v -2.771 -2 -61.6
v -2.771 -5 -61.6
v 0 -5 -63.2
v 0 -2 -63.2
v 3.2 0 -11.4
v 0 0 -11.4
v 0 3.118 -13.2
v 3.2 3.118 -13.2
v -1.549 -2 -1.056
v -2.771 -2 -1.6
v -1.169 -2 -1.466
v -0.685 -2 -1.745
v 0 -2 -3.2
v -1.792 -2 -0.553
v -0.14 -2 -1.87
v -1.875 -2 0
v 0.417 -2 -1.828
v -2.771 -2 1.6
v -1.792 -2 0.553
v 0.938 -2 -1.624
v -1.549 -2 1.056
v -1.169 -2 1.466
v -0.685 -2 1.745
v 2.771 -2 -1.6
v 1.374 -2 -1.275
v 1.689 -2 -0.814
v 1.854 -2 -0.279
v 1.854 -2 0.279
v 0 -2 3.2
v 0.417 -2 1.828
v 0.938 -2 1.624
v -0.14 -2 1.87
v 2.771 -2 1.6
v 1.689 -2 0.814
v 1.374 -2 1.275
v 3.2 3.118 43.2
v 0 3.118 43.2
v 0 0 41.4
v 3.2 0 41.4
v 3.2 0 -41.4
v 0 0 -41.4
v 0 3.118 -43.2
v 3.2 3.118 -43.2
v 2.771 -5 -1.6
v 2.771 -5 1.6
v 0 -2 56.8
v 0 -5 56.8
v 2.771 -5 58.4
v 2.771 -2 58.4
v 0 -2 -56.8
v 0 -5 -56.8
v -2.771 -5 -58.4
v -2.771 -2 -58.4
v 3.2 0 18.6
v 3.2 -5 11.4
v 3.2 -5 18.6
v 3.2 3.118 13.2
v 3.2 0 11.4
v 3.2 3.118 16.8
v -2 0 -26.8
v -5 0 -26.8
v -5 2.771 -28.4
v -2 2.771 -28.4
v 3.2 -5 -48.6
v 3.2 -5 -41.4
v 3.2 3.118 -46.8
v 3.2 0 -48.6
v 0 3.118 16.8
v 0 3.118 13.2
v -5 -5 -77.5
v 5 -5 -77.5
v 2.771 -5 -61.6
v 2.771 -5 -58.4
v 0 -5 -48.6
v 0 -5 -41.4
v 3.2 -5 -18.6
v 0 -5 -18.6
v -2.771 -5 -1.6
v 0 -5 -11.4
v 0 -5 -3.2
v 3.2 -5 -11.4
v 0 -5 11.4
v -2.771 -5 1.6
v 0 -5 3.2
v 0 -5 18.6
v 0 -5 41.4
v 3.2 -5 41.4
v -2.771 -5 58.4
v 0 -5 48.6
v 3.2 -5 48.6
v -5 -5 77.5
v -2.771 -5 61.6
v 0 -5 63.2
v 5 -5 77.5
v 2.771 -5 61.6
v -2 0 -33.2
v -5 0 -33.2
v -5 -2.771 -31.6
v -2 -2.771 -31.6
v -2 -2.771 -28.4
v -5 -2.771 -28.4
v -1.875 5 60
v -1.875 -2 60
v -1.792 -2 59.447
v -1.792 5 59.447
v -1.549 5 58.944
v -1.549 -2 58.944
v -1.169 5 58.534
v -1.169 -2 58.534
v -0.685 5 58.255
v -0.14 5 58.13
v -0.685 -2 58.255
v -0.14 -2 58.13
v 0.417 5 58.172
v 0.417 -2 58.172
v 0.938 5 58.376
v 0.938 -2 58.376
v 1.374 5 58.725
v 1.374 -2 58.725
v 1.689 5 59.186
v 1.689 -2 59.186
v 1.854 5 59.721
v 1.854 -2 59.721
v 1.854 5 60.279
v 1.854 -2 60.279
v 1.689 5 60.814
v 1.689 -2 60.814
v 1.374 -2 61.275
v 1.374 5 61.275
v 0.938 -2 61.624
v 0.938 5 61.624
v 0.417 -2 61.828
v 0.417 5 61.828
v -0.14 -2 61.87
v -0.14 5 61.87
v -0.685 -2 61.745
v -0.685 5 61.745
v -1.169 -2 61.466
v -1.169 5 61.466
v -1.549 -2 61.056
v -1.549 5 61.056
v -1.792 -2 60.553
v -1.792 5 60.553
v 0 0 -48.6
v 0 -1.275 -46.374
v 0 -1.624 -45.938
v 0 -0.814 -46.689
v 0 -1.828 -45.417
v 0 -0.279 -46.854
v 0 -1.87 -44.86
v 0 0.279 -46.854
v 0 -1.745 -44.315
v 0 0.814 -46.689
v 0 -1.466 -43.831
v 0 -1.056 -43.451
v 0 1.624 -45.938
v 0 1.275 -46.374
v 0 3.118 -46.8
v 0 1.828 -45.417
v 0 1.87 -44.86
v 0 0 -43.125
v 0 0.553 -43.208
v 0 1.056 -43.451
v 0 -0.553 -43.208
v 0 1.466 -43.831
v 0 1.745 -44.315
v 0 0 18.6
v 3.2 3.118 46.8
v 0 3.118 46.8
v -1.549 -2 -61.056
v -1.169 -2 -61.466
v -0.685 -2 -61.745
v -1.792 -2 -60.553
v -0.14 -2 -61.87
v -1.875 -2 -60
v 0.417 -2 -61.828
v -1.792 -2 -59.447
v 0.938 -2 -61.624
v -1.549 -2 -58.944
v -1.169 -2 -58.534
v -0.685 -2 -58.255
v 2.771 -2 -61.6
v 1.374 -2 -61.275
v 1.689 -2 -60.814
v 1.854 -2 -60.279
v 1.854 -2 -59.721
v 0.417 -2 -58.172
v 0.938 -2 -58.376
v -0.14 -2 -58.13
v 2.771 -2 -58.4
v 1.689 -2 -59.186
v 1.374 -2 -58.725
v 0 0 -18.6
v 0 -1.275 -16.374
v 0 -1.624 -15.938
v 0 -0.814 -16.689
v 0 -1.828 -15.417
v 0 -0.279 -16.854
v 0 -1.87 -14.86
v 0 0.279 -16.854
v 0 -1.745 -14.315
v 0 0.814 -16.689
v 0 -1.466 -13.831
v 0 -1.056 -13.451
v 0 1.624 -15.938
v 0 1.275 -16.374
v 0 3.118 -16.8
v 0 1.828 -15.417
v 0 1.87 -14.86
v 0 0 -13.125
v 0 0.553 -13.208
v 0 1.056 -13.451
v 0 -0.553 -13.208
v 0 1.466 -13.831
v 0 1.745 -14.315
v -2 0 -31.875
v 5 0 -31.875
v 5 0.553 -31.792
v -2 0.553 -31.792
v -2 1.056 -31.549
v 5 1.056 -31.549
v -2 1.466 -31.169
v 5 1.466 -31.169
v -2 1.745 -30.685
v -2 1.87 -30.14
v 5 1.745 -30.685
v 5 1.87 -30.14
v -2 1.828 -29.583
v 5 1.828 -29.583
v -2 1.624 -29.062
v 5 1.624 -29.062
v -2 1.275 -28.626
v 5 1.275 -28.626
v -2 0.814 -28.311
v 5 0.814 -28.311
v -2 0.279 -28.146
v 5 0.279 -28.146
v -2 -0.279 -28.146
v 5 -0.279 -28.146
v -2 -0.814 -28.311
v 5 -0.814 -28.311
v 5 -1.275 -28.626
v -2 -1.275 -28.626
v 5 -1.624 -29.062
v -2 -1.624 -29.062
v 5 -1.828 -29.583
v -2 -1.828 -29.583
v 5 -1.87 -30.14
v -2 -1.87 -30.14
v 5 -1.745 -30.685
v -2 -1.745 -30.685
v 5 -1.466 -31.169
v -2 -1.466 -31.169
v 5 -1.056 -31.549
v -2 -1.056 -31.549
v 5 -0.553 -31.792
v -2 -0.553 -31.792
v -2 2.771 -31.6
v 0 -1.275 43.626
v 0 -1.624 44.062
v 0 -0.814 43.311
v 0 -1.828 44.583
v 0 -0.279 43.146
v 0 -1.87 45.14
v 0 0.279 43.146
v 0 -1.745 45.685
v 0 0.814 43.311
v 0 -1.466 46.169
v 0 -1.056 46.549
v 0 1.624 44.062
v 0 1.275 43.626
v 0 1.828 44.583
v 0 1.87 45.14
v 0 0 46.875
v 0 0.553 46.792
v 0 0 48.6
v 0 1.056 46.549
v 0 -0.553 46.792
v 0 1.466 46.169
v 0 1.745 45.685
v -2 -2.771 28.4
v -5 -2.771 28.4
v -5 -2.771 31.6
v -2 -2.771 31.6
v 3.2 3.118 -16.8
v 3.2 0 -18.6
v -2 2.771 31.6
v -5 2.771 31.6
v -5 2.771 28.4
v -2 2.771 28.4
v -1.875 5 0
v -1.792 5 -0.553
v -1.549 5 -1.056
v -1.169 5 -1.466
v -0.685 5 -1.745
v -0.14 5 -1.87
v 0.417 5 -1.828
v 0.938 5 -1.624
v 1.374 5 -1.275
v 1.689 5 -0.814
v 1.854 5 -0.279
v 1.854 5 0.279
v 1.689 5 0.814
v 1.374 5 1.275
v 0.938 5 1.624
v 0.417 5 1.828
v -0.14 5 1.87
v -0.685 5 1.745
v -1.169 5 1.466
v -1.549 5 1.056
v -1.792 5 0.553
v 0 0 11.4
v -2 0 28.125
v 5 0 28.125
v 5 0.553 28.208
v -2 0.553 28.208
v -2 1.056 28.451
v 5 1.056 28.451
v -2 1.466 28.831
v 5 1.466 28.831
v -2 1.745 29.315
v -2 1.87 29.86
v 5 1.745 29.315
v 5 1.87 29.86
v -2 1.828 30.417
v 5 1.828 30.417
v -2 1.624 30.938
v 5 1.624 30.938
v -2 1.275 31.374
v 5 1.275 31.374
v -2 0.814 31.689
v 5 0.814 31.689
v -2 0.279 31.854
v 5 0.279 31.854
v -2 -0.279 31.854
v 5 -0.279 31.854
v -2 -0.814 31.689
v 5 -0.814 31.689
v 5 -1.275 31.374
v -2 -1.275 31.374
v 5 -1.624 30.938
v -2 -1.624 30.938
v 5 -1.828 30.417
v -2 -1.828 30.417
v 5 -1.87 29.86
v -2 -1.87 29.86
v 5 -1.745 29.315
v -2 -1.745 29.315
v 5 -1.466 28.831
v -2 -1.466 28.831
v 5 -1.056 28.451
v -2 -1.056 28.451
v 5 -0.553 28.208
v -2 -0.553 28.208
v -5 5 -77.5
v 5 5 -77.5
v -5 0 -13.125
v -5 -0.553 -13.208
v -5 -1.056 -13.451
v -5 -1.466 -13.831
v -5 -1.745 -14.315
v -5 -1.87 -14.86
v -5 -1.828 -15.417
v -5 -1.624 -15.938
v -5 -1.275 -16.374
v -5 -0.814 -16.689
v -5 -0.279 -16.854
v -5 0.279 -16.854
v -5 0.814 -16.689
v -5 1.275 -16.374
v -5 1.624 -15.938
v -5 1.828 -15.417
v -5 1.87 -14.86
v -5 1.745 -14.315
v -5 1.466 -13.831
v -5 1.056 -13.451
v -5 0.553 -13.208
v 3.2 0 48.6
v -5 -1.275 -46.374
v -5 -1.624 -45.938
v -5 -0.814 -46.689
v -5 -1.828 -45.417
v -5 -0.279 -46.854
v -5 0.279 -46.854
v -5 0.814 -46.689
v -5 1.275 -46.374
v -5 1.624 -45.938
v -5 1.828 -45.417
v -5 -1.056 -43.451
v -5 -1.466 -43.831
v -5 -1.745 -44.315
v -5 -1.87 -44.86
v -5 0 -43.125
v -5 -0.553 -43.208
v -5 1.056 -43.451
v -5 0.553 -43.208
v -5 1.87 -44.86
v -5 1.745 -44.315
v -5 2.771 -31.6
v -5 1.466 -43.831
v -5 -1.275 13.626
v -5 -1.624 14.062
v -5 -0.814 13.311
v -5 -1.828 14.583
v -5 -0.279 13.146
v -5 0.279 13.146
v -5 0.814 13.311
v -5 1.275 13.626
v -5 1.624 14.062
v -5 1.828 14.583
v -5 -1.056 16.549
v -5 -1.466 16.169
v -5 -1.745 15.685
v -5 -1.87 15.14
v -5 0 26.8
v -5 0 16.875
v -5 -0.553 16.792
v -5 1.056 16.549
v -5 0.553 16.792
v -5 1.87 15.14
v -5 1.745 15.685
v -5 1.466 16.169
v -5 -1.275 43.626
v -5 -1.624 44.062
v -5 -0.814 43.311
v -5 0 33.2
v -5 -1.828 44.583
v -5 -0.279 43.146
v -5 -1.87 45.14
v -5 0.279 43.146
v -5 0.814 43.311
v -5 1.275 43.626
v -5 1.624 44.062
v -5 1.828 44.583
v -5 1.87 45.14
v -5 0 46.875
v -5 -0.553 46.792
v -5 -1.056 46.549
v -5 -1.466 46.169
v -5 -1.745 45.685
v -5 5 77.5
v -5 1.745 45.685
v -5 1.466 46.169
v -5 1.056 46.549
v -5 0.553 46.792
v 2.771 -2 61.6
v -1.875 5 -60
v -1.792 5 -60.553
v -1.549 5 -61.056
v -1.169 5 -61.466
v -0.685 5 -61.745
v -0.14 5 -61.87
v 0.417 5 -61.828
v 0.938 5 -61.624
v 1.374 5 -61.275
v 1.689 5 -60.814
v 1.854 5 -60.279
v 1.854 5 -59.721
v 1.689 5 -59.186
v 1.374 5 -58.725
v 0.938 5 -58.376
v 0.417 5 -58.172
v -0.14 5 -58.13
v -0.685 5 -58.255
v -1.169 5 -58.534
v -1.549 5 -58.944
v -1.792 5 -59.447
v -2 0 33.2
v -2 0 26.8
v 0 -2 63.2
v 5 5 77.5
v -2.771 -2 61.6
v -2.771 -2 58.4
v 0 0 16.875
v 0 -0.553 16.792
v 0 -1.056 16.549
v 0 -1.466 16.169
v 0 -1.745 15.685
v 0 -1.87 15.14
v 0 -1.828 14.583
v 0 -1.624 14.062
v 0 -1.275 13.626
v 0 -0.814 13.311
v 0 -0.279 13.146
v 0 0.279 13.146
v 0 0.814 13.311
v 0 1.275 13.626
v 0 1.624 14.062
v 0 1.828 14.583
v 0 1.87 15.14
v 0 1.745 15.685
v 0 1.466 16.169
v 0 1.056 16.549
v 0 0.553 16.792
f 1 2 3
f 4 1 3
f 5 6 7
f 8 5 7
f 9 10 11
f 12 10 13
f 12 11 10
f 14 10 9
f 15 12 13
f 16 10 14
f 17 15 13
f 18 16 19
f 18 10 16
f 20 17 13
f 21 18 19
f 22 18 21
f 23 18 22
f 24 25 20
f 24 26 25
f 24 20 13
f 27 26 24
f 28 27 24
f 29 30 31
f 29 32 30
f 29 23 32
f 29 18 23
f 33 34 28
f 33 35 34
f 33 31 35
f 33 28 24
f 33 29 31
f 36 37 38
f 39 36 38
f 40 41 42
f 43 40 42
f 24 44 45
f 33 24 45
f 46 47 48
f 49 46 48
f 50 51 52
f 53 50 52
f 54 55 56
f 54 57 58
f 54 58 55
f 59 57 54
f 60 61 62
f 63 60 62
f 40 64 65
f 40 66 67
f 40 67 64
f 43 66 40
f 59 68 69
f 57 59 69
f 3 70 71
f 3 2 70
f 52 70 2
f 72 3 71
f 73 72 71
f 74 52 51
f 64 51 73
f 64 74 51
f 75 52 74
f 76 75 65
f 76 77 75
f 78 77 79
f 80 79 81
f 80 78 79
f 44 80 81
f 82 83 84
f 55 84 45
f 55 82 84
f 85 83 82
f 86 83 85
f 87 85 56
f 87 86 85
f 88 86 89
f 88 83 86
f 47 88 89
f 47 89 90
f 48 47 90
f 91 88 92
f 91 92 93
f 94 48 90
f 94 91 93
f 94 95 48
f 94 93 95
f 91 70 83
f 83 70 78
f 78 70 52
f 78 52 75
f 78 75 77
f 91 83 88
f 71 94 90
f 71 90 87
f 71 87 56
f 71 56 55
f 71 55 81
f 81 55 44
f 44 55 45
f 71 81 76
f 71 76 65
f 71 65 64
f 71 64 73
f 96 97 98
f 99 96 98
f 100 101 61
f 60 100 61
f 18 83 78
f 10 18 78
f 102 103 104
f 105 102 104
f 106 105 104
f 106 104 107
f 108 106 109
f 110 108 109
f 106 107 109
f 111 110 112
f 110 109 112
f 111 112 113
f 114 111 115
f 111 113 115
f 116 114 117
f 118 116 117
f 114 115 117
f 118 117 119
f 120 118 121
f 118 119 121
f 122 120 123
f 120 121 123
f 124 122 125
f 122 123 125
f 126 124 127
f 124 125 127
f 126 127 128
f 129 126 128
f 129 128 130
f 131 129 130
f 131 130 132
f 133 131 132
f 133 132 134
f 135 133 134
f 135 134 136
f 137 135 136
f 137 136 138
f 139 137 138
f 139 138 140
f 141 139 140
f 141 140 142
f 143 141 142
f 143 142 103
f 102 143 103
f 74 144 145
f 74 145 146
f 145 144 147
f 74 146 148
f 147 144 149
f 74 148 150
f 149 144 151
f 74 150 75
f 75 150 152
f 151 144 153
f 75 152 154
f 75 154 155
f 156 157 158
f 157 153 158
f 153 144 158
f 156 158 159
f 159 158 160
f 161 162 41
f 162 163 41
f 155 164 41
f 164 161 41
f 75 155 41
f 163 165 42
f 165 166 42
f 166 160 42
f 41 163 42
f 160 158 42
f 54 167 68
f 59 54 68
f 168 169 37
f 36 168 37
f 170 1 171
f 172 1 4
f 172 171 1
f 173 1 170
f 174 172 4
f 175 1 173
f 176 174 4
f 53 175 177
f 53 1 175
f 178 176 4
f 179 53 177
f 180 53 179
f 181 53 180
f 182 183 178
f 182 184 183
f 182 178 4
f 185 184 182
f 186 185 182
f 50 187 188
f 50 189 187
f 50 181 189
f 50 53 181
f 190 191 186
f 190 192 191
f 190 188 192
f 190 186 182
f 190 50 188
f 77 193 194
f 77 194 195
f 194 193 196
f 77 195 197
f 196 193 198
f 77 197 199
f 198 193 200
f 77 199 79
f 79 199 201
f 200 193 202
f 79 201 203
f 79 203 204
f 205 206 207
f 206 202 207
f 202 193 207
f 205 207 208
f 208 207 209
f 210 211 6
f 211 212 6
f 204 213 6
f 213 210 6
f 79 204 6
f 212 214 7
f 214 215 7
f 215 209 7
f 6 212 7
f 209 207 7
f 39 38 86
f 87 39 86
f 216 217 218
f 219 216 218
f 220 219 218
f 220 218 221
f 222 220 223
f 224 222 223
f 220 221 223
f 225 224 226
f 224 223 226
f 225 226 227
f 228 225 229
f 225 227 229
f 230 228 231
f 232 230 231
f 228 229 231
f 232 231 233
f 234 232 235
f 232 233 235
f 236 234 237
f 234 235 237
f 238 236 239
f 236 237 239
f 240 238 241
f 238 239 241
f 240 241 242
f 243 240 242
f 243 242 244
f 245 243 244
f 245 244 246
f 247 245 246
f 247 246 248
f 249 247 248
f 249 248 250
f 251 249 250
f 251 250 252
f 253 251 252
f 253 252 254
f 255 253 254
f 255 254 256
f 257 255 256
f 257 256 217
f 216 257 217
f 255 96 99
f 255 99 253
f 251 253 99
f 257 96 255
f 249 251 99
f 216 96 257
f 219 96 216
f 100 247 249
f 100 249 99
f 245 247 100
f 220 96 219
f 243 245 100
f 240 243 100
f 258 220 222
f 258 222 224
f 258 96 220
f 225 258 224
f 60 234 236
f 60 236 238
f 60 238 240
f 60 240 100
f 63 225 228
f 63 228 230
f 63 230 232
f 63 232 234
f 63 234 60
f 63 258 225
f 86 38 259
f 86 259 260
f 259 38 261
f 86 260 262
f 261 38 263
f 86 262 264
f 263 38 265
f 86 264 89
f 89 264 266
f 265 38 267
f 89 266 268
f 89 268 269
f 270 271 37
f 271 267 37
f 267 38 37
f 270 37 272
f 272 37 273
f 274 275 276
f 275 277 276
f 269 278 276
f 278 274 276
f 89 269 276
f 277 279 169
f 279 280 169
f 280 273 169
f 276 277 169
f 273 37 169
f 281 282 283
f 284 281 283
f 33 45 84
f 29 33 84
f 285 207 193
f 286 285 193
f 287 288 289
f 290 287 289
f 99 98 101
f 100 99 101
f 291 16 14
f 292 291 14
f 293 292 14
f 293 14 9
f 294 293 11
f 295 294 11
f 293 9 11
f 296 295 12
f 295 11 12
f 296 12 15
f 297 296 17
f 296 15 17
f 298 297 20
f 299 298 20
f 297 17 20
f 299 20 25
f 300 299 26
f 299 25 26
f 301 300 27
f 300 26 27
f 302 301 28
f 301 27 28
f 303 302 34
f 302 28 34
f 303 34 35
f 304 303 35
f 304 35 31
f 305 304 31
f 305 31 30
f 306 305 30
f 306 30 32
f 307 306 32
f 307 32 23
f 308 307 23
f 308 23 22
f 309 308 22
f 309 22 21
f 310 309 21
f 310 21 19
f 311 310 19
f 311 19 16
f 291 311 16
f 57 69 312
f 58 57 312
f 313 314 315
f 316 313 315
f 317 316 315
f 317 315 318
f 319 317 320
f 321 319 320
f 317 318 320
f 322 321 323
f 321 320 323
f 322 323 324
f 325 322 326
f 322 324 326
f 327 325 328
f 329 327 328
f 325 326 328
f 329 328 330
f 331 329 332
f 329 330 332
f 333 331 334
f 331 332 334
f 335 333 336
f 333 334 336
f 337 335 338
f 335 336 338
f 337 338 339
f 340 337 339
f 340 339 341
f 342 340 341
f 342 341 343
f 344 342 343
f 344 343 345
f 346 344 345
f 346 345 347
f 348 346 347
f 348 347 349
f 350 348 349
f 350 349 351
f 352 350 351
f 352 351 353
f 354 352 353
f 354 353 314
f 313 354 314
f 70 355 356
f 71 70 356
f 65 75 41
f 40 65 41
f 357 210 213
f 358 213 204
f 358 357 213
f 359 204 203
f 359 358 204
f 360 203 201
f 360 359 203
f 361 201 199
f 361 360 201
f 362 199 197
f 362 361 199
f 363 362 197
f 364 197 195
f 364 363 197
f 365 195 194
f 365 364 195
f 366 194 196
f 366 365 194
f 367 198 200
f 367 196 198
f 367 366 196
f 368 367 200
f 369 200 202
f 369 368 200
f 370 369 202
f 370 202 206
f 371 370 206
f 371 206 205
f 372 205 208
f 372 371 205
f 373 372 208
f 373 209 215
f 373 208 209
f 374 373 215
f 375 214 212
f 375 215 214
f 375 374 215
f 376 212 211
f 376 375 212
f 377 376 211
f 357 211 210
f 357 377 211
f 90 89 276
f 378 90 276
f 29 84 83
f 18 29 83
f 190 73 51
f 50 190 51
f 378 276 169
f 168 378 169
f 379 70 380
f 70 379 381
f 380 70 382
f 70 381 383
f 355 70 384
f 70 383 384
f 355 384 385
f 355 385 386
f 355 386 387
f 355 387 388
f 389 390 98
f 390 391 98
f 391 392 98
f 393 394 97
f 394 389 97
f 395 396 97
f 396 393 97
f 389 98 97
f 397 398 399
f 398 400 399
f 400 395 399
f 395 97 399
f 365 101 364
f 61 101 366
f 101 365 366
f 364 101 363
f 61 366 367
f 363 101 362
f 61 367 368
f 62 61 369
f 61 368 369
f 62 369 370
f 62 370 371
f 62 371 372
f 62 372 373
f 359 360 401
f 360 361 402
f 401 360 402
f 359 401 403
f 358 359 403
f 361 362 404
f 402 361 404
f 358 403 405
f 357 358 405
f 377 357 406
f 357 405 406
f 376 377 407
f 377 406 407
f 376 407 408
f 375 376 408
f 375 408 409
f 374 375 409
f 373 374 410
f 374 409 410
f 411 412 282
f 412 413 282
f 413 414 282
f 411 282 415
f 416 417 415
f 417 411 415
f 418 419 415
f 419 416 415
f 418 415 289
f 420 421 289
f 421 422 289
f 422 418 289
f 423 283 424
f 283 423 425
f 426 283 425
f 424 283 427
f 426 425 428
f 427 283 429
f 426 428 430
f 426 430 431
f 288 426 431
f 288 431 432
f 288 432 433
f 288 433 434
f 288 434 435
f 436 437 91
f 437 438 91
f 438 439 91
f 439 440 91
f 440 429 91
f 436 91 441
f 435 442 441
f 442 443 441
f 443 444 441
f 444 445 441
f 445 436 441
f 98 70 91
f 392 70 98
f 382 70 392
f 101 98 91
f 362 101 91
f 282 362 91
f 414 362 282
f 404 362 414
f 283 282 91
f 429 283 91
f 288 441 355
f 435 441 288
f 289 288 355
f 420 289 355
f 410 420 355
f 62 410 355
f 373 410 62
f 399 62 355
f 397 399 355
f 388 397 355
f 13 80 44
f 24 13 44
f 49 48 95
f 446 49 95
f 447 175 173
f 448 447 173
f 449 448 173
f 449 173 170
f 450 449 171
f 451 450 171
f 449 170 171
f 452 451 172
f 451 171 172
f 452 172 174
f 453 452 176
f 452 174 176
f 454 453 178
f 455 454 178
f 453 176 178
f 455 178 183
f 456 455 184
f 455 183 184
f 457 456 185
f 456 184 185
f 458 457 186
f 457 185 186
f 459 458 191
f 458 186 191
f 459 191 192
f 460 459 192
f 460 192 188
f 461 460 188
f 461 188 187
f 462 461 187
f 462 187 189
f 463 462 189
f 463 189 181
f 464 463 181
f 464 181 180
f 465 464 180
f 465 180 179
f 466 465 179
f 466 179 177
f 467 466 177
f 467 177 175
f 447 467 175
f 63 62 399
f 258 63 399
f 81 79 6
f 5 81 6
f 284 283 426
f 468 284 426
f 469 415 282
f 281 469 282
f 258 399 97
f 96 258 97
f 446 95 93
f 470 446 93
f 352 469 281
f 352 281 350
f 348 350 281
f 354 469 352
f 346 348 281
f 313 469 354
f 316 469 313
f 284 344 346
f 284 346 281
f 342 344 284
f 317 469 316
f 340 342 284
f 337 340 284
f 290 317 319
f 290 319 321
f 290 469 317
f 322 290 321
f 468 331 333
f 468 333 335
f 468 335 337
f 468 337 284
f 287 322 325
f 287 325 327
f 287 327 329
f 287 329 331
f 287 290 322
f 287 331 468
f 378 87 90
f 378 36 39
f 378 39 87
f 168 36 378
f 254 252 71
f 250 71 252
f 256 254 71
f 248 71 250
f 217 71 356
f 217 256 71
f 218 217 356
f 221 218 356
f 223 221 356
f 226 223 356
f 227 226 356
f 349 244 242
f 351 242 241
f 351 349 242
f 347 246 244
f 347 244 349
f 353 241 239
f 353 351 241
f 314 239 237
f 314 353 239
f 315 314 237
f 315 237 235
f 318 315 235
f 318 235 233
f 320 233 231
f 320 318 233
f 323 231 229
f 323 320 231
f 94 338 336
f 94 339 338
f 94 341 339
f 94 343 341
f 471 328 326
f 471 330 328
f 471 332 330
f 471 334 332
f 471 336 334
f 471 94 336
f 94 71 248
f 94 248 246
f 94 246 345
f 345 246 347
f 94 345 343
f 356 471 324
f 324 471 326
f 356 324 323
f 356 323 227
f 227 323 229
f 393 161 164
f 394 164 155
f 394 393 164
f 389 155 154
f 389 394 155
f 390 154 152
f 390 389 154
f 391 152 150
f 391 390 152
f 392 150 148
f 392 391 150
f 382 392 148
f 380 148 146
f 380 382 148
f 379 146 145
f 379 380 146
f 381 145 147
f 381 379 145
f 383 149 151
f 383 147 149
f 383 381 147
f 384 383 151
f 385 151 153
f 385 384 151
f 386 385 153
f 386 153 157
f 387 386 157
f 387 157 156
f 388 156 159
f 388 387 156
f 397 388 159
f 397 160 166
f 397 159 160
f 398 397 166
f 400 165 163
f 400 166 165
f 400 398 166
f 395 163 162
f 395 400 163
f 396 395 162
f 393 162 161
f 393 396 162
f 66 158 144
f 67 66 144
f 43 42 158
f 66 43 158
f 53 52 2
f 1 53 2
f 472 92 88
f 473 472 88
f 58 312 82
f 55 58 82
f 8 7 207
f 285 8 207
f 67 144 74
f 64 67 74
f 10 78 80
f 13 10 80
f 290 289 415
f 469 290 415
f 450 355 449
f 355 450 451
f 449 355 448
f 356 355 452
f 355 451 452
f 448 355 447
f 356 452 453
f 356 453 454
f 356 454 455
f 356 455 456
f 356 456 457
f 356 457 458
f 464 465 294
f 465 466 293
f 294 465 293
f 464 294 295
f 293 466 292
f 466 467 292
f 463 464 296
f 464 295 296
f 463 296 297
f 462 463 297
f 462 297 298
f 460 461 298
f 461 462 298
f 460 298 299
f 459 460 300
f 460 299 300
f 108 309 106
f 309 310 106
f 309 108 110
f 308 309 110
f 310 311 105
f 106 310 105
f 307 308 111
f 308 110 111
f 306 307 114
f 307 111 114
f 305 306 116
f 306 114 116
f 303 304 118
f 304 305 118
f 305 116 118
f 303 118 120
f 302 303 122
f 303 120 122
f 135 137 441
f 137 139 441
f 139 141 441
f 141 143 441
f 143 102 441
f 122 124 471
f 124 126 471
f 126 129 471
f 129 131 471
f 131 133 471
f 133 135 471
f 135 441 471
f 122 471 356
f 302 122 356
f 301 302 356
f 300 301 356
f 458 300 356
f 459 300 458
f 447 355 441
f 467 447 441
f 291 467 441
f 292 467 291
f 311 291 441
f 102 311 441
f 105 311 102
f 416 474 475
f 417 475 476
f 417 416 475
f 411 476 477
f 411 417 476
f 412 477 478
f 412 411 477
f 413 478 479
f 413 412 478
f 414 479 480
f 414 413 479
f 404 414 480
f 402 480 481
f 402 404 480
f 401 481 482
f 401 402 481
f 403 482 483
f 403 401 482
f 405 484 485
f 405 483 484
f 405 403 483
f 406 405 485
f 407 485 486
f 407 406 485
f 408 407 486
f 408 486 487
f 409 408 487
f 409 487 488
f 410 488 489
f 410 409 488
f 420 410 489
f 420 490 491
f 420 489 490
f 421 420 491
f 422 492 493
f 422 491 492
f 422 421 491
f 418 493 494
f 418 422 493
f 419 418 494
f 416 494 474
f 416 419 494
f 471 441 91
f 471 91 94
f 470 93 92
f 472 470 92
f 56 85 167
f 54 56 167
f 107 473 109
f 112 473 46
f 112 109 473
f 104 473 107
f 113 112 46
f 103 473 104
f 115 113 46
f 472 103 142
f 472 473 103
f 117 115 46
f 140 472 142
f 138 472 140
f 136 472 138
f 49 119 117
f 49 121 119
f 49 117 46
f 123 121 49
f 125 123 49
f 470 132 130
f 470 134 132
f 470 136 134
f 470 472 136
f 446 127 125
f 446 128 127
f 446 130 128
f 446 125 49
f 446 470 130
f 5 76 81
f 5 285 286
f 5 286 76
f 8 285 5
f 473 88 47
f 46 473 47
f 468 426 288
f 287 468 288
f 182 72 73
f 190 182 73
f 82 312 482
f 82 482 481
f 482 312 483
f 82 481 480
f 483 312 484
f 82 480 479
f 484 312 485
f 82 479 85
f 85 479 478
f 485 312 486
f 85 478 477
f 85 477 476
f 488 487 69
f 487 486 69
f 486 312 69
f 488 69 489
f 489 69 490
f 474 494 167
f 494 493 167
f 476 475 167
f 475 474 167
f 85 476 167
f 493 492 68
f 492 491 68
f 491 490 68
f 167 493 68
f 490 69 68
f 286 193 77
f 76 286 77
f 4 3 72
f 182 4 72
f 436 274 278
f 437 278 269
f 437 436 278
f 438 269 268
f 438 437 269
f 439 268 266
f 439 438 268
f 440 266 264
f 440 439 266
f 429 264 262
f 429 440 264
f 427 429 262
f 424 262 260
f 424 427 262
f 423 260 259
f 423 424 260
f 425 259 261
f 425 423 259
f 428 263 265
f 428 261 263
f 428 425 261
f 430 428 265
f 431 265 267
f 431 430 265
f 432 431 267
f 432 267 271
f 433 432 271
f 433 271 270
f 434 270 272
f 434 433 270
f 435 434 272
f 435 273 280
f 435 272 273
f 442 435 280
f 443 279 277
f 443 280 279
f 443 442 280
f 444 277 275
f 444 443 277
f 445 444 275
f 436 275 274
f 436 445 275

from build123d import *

# Parameters (mm, degrees)
CROQUIS1_W                   = 10
CROQUIS1_H                   = 10
SALIENTE_EXTRUIR1_DEPTH      = 77.5
TALADRO_DE_MARGEN_PARA_M31_D = 3.75
CORTAR_EXTRUIR1_DEPTH        = 3
TALADRO_DE_MARGEN_PARA_M32_D = 3.75
CORTAR_EXTRUIR2_DEPTH        = 3
CORTAR_EXTRUIR3_DEPTH        = 3.2
MATRIZL1_COUNT               = 3
MATRIZL1_PITCH               = 30
MATRIZL1_COL_COUNT           = 2
MATRIZL1_COL_PITCH           = 30


with BuildPart() as part:
    # Croquis1 → Saliente-Extruir1 (new body, symmetric)
    with BuildSketch(Plane.XY):
        Rectangle(CROQUIS1_W, CROQUIS1_H)
    extrude(amount=SALIENTE_EXTRUIR1_DEPTH, both=True)

    # Taladro de margen para M31 (through all)
    with Locations(Plane(origin=(0, 5, 0), x_dir=(1, 0, 0), z_dir=(0, 1, 0))):
        with Locations((0, -60), (0, 0), (0, 60)):
            Hole(TALADRO_DE_MARGEN_PARA_M31_D / 2)

    # Croquis7 → Cortar-Extruir1 (cut)
    with BuildSketch(Plane.XZ.offset(5)):
        Polygon((2.771281292, -58.4), (0, -56.8), (-2.771281292, -58.4), (-2.771281292, -61.6), (0, -63.2), (2.771281292, -61.6), align=None)
        Polygon((2.771281292, -1.6), (2.771281292, 1.6), (0, 3.2), (-2.771281292, 1.6), (-2.771281292, -1.6), (0, -3.2), align=None)
        Polygon((2.771281292, 58.4), (2.771281292, 61.6), (0, 63.2), (-2.771281292, 61.6), (-2.771281292, 58.4), (0, 56.8), align=None)
    extrude(amount=-CORTAR_EXTRUIR1_DEPTH, mode=Mode.SUBTRACT)

    # Taladro de margen para M32 (through all)
    with Locations(Plane.ZY.offset(5)):
        with Locations((-30, 0), (30, 0)):
            Hole(TALADRO_DE_MARGEN_PARA_M32_D / 2)

    # Croquis10 → Cortar-Extruir2 (cut)
    with BuildSketch(Plane.ZY.offset(5)):
        Polygon((-28.4, -2.771281292), (-26.8, 0), (-28.4, 2.771281292), (-31.6, 2.771281292), (-33.2, 0), (-31.6, -2.771281292), align=None)
        Polygon((31.6, -2.771281292), (33.2, 0), (31.6, 2.771281292), (28.4, 2.771281292), (26.8, 0), (28.4, -2.771281292), align=None)
    extrude(amount=-CORTAR_EXTRUIR2_DEPTH, mode=Mode.SUBTRACT)

    # Croquis13 → Taladro de margen para M33 (revolve, cut)
    with BuildSketch(Plane(origin=(-5, 0, -15), x_dir=(0, 0, 1), z_dir=(0, 1, 0))):
        Polygon((0, 0), (0, 7.126613661), (1.875, 6), (1.875, 0), align=None)
    taladro_de_margen_para_m33 = revolve(axis=Axis((-11.35, 0, -15), (1, 0, 0)), mode=Mode.SUBTRACT)

    # Croquis15 → Cortar-Extruir3 (cut)
    with BuildSketch(Plane.ZY):
        Polygon((-18.6, -5), (-11.4, -5), (-11.4, 0), (-13.2, -3.117691454), (-16.8, -3.117691454), (-18.6, 0), align=None)
        Polygon((-16.8, -3.117691454), (-13.2, -3.117691454), (-11.4, 0), (-13.2, 3.117691454), (-16.8, 3.117691454), (-18.6, 0), align=None)
    cortar_extruir3 = extrude(amount=-CORTAR_EXTRUIR3_DEPTH, mode=Mode.SUBTRACT)

    # MatrizL1: Taladro de margen para M33, Cortar-Extruir3 ×3
    with Locations(*[(0, 0, i * MATRIZL1_PITCH) for i in range(1, MATRIZL1_COUNT)]):
        add(taladro_de_margen_para_m33, mode=Mode.SUBTRACT)
        add(cortar_extruir3, mode=Mode.SUBTRACT)

    # MatrizL1 col: Taladro de margen para M33, Cortar-Extruir3 ×2
    with Locations(*[(0, 0, -i * MATRIZL1_COL_PITCH) for i in range(1, MATRIZL1_COL_COUNT)]):
        add(taladro_de_margen_para_m33, mode=Mode.SUBTRACT)
        add(cortar_extruir3, mode=Mode.SUBTRACT)


solid = part.part
